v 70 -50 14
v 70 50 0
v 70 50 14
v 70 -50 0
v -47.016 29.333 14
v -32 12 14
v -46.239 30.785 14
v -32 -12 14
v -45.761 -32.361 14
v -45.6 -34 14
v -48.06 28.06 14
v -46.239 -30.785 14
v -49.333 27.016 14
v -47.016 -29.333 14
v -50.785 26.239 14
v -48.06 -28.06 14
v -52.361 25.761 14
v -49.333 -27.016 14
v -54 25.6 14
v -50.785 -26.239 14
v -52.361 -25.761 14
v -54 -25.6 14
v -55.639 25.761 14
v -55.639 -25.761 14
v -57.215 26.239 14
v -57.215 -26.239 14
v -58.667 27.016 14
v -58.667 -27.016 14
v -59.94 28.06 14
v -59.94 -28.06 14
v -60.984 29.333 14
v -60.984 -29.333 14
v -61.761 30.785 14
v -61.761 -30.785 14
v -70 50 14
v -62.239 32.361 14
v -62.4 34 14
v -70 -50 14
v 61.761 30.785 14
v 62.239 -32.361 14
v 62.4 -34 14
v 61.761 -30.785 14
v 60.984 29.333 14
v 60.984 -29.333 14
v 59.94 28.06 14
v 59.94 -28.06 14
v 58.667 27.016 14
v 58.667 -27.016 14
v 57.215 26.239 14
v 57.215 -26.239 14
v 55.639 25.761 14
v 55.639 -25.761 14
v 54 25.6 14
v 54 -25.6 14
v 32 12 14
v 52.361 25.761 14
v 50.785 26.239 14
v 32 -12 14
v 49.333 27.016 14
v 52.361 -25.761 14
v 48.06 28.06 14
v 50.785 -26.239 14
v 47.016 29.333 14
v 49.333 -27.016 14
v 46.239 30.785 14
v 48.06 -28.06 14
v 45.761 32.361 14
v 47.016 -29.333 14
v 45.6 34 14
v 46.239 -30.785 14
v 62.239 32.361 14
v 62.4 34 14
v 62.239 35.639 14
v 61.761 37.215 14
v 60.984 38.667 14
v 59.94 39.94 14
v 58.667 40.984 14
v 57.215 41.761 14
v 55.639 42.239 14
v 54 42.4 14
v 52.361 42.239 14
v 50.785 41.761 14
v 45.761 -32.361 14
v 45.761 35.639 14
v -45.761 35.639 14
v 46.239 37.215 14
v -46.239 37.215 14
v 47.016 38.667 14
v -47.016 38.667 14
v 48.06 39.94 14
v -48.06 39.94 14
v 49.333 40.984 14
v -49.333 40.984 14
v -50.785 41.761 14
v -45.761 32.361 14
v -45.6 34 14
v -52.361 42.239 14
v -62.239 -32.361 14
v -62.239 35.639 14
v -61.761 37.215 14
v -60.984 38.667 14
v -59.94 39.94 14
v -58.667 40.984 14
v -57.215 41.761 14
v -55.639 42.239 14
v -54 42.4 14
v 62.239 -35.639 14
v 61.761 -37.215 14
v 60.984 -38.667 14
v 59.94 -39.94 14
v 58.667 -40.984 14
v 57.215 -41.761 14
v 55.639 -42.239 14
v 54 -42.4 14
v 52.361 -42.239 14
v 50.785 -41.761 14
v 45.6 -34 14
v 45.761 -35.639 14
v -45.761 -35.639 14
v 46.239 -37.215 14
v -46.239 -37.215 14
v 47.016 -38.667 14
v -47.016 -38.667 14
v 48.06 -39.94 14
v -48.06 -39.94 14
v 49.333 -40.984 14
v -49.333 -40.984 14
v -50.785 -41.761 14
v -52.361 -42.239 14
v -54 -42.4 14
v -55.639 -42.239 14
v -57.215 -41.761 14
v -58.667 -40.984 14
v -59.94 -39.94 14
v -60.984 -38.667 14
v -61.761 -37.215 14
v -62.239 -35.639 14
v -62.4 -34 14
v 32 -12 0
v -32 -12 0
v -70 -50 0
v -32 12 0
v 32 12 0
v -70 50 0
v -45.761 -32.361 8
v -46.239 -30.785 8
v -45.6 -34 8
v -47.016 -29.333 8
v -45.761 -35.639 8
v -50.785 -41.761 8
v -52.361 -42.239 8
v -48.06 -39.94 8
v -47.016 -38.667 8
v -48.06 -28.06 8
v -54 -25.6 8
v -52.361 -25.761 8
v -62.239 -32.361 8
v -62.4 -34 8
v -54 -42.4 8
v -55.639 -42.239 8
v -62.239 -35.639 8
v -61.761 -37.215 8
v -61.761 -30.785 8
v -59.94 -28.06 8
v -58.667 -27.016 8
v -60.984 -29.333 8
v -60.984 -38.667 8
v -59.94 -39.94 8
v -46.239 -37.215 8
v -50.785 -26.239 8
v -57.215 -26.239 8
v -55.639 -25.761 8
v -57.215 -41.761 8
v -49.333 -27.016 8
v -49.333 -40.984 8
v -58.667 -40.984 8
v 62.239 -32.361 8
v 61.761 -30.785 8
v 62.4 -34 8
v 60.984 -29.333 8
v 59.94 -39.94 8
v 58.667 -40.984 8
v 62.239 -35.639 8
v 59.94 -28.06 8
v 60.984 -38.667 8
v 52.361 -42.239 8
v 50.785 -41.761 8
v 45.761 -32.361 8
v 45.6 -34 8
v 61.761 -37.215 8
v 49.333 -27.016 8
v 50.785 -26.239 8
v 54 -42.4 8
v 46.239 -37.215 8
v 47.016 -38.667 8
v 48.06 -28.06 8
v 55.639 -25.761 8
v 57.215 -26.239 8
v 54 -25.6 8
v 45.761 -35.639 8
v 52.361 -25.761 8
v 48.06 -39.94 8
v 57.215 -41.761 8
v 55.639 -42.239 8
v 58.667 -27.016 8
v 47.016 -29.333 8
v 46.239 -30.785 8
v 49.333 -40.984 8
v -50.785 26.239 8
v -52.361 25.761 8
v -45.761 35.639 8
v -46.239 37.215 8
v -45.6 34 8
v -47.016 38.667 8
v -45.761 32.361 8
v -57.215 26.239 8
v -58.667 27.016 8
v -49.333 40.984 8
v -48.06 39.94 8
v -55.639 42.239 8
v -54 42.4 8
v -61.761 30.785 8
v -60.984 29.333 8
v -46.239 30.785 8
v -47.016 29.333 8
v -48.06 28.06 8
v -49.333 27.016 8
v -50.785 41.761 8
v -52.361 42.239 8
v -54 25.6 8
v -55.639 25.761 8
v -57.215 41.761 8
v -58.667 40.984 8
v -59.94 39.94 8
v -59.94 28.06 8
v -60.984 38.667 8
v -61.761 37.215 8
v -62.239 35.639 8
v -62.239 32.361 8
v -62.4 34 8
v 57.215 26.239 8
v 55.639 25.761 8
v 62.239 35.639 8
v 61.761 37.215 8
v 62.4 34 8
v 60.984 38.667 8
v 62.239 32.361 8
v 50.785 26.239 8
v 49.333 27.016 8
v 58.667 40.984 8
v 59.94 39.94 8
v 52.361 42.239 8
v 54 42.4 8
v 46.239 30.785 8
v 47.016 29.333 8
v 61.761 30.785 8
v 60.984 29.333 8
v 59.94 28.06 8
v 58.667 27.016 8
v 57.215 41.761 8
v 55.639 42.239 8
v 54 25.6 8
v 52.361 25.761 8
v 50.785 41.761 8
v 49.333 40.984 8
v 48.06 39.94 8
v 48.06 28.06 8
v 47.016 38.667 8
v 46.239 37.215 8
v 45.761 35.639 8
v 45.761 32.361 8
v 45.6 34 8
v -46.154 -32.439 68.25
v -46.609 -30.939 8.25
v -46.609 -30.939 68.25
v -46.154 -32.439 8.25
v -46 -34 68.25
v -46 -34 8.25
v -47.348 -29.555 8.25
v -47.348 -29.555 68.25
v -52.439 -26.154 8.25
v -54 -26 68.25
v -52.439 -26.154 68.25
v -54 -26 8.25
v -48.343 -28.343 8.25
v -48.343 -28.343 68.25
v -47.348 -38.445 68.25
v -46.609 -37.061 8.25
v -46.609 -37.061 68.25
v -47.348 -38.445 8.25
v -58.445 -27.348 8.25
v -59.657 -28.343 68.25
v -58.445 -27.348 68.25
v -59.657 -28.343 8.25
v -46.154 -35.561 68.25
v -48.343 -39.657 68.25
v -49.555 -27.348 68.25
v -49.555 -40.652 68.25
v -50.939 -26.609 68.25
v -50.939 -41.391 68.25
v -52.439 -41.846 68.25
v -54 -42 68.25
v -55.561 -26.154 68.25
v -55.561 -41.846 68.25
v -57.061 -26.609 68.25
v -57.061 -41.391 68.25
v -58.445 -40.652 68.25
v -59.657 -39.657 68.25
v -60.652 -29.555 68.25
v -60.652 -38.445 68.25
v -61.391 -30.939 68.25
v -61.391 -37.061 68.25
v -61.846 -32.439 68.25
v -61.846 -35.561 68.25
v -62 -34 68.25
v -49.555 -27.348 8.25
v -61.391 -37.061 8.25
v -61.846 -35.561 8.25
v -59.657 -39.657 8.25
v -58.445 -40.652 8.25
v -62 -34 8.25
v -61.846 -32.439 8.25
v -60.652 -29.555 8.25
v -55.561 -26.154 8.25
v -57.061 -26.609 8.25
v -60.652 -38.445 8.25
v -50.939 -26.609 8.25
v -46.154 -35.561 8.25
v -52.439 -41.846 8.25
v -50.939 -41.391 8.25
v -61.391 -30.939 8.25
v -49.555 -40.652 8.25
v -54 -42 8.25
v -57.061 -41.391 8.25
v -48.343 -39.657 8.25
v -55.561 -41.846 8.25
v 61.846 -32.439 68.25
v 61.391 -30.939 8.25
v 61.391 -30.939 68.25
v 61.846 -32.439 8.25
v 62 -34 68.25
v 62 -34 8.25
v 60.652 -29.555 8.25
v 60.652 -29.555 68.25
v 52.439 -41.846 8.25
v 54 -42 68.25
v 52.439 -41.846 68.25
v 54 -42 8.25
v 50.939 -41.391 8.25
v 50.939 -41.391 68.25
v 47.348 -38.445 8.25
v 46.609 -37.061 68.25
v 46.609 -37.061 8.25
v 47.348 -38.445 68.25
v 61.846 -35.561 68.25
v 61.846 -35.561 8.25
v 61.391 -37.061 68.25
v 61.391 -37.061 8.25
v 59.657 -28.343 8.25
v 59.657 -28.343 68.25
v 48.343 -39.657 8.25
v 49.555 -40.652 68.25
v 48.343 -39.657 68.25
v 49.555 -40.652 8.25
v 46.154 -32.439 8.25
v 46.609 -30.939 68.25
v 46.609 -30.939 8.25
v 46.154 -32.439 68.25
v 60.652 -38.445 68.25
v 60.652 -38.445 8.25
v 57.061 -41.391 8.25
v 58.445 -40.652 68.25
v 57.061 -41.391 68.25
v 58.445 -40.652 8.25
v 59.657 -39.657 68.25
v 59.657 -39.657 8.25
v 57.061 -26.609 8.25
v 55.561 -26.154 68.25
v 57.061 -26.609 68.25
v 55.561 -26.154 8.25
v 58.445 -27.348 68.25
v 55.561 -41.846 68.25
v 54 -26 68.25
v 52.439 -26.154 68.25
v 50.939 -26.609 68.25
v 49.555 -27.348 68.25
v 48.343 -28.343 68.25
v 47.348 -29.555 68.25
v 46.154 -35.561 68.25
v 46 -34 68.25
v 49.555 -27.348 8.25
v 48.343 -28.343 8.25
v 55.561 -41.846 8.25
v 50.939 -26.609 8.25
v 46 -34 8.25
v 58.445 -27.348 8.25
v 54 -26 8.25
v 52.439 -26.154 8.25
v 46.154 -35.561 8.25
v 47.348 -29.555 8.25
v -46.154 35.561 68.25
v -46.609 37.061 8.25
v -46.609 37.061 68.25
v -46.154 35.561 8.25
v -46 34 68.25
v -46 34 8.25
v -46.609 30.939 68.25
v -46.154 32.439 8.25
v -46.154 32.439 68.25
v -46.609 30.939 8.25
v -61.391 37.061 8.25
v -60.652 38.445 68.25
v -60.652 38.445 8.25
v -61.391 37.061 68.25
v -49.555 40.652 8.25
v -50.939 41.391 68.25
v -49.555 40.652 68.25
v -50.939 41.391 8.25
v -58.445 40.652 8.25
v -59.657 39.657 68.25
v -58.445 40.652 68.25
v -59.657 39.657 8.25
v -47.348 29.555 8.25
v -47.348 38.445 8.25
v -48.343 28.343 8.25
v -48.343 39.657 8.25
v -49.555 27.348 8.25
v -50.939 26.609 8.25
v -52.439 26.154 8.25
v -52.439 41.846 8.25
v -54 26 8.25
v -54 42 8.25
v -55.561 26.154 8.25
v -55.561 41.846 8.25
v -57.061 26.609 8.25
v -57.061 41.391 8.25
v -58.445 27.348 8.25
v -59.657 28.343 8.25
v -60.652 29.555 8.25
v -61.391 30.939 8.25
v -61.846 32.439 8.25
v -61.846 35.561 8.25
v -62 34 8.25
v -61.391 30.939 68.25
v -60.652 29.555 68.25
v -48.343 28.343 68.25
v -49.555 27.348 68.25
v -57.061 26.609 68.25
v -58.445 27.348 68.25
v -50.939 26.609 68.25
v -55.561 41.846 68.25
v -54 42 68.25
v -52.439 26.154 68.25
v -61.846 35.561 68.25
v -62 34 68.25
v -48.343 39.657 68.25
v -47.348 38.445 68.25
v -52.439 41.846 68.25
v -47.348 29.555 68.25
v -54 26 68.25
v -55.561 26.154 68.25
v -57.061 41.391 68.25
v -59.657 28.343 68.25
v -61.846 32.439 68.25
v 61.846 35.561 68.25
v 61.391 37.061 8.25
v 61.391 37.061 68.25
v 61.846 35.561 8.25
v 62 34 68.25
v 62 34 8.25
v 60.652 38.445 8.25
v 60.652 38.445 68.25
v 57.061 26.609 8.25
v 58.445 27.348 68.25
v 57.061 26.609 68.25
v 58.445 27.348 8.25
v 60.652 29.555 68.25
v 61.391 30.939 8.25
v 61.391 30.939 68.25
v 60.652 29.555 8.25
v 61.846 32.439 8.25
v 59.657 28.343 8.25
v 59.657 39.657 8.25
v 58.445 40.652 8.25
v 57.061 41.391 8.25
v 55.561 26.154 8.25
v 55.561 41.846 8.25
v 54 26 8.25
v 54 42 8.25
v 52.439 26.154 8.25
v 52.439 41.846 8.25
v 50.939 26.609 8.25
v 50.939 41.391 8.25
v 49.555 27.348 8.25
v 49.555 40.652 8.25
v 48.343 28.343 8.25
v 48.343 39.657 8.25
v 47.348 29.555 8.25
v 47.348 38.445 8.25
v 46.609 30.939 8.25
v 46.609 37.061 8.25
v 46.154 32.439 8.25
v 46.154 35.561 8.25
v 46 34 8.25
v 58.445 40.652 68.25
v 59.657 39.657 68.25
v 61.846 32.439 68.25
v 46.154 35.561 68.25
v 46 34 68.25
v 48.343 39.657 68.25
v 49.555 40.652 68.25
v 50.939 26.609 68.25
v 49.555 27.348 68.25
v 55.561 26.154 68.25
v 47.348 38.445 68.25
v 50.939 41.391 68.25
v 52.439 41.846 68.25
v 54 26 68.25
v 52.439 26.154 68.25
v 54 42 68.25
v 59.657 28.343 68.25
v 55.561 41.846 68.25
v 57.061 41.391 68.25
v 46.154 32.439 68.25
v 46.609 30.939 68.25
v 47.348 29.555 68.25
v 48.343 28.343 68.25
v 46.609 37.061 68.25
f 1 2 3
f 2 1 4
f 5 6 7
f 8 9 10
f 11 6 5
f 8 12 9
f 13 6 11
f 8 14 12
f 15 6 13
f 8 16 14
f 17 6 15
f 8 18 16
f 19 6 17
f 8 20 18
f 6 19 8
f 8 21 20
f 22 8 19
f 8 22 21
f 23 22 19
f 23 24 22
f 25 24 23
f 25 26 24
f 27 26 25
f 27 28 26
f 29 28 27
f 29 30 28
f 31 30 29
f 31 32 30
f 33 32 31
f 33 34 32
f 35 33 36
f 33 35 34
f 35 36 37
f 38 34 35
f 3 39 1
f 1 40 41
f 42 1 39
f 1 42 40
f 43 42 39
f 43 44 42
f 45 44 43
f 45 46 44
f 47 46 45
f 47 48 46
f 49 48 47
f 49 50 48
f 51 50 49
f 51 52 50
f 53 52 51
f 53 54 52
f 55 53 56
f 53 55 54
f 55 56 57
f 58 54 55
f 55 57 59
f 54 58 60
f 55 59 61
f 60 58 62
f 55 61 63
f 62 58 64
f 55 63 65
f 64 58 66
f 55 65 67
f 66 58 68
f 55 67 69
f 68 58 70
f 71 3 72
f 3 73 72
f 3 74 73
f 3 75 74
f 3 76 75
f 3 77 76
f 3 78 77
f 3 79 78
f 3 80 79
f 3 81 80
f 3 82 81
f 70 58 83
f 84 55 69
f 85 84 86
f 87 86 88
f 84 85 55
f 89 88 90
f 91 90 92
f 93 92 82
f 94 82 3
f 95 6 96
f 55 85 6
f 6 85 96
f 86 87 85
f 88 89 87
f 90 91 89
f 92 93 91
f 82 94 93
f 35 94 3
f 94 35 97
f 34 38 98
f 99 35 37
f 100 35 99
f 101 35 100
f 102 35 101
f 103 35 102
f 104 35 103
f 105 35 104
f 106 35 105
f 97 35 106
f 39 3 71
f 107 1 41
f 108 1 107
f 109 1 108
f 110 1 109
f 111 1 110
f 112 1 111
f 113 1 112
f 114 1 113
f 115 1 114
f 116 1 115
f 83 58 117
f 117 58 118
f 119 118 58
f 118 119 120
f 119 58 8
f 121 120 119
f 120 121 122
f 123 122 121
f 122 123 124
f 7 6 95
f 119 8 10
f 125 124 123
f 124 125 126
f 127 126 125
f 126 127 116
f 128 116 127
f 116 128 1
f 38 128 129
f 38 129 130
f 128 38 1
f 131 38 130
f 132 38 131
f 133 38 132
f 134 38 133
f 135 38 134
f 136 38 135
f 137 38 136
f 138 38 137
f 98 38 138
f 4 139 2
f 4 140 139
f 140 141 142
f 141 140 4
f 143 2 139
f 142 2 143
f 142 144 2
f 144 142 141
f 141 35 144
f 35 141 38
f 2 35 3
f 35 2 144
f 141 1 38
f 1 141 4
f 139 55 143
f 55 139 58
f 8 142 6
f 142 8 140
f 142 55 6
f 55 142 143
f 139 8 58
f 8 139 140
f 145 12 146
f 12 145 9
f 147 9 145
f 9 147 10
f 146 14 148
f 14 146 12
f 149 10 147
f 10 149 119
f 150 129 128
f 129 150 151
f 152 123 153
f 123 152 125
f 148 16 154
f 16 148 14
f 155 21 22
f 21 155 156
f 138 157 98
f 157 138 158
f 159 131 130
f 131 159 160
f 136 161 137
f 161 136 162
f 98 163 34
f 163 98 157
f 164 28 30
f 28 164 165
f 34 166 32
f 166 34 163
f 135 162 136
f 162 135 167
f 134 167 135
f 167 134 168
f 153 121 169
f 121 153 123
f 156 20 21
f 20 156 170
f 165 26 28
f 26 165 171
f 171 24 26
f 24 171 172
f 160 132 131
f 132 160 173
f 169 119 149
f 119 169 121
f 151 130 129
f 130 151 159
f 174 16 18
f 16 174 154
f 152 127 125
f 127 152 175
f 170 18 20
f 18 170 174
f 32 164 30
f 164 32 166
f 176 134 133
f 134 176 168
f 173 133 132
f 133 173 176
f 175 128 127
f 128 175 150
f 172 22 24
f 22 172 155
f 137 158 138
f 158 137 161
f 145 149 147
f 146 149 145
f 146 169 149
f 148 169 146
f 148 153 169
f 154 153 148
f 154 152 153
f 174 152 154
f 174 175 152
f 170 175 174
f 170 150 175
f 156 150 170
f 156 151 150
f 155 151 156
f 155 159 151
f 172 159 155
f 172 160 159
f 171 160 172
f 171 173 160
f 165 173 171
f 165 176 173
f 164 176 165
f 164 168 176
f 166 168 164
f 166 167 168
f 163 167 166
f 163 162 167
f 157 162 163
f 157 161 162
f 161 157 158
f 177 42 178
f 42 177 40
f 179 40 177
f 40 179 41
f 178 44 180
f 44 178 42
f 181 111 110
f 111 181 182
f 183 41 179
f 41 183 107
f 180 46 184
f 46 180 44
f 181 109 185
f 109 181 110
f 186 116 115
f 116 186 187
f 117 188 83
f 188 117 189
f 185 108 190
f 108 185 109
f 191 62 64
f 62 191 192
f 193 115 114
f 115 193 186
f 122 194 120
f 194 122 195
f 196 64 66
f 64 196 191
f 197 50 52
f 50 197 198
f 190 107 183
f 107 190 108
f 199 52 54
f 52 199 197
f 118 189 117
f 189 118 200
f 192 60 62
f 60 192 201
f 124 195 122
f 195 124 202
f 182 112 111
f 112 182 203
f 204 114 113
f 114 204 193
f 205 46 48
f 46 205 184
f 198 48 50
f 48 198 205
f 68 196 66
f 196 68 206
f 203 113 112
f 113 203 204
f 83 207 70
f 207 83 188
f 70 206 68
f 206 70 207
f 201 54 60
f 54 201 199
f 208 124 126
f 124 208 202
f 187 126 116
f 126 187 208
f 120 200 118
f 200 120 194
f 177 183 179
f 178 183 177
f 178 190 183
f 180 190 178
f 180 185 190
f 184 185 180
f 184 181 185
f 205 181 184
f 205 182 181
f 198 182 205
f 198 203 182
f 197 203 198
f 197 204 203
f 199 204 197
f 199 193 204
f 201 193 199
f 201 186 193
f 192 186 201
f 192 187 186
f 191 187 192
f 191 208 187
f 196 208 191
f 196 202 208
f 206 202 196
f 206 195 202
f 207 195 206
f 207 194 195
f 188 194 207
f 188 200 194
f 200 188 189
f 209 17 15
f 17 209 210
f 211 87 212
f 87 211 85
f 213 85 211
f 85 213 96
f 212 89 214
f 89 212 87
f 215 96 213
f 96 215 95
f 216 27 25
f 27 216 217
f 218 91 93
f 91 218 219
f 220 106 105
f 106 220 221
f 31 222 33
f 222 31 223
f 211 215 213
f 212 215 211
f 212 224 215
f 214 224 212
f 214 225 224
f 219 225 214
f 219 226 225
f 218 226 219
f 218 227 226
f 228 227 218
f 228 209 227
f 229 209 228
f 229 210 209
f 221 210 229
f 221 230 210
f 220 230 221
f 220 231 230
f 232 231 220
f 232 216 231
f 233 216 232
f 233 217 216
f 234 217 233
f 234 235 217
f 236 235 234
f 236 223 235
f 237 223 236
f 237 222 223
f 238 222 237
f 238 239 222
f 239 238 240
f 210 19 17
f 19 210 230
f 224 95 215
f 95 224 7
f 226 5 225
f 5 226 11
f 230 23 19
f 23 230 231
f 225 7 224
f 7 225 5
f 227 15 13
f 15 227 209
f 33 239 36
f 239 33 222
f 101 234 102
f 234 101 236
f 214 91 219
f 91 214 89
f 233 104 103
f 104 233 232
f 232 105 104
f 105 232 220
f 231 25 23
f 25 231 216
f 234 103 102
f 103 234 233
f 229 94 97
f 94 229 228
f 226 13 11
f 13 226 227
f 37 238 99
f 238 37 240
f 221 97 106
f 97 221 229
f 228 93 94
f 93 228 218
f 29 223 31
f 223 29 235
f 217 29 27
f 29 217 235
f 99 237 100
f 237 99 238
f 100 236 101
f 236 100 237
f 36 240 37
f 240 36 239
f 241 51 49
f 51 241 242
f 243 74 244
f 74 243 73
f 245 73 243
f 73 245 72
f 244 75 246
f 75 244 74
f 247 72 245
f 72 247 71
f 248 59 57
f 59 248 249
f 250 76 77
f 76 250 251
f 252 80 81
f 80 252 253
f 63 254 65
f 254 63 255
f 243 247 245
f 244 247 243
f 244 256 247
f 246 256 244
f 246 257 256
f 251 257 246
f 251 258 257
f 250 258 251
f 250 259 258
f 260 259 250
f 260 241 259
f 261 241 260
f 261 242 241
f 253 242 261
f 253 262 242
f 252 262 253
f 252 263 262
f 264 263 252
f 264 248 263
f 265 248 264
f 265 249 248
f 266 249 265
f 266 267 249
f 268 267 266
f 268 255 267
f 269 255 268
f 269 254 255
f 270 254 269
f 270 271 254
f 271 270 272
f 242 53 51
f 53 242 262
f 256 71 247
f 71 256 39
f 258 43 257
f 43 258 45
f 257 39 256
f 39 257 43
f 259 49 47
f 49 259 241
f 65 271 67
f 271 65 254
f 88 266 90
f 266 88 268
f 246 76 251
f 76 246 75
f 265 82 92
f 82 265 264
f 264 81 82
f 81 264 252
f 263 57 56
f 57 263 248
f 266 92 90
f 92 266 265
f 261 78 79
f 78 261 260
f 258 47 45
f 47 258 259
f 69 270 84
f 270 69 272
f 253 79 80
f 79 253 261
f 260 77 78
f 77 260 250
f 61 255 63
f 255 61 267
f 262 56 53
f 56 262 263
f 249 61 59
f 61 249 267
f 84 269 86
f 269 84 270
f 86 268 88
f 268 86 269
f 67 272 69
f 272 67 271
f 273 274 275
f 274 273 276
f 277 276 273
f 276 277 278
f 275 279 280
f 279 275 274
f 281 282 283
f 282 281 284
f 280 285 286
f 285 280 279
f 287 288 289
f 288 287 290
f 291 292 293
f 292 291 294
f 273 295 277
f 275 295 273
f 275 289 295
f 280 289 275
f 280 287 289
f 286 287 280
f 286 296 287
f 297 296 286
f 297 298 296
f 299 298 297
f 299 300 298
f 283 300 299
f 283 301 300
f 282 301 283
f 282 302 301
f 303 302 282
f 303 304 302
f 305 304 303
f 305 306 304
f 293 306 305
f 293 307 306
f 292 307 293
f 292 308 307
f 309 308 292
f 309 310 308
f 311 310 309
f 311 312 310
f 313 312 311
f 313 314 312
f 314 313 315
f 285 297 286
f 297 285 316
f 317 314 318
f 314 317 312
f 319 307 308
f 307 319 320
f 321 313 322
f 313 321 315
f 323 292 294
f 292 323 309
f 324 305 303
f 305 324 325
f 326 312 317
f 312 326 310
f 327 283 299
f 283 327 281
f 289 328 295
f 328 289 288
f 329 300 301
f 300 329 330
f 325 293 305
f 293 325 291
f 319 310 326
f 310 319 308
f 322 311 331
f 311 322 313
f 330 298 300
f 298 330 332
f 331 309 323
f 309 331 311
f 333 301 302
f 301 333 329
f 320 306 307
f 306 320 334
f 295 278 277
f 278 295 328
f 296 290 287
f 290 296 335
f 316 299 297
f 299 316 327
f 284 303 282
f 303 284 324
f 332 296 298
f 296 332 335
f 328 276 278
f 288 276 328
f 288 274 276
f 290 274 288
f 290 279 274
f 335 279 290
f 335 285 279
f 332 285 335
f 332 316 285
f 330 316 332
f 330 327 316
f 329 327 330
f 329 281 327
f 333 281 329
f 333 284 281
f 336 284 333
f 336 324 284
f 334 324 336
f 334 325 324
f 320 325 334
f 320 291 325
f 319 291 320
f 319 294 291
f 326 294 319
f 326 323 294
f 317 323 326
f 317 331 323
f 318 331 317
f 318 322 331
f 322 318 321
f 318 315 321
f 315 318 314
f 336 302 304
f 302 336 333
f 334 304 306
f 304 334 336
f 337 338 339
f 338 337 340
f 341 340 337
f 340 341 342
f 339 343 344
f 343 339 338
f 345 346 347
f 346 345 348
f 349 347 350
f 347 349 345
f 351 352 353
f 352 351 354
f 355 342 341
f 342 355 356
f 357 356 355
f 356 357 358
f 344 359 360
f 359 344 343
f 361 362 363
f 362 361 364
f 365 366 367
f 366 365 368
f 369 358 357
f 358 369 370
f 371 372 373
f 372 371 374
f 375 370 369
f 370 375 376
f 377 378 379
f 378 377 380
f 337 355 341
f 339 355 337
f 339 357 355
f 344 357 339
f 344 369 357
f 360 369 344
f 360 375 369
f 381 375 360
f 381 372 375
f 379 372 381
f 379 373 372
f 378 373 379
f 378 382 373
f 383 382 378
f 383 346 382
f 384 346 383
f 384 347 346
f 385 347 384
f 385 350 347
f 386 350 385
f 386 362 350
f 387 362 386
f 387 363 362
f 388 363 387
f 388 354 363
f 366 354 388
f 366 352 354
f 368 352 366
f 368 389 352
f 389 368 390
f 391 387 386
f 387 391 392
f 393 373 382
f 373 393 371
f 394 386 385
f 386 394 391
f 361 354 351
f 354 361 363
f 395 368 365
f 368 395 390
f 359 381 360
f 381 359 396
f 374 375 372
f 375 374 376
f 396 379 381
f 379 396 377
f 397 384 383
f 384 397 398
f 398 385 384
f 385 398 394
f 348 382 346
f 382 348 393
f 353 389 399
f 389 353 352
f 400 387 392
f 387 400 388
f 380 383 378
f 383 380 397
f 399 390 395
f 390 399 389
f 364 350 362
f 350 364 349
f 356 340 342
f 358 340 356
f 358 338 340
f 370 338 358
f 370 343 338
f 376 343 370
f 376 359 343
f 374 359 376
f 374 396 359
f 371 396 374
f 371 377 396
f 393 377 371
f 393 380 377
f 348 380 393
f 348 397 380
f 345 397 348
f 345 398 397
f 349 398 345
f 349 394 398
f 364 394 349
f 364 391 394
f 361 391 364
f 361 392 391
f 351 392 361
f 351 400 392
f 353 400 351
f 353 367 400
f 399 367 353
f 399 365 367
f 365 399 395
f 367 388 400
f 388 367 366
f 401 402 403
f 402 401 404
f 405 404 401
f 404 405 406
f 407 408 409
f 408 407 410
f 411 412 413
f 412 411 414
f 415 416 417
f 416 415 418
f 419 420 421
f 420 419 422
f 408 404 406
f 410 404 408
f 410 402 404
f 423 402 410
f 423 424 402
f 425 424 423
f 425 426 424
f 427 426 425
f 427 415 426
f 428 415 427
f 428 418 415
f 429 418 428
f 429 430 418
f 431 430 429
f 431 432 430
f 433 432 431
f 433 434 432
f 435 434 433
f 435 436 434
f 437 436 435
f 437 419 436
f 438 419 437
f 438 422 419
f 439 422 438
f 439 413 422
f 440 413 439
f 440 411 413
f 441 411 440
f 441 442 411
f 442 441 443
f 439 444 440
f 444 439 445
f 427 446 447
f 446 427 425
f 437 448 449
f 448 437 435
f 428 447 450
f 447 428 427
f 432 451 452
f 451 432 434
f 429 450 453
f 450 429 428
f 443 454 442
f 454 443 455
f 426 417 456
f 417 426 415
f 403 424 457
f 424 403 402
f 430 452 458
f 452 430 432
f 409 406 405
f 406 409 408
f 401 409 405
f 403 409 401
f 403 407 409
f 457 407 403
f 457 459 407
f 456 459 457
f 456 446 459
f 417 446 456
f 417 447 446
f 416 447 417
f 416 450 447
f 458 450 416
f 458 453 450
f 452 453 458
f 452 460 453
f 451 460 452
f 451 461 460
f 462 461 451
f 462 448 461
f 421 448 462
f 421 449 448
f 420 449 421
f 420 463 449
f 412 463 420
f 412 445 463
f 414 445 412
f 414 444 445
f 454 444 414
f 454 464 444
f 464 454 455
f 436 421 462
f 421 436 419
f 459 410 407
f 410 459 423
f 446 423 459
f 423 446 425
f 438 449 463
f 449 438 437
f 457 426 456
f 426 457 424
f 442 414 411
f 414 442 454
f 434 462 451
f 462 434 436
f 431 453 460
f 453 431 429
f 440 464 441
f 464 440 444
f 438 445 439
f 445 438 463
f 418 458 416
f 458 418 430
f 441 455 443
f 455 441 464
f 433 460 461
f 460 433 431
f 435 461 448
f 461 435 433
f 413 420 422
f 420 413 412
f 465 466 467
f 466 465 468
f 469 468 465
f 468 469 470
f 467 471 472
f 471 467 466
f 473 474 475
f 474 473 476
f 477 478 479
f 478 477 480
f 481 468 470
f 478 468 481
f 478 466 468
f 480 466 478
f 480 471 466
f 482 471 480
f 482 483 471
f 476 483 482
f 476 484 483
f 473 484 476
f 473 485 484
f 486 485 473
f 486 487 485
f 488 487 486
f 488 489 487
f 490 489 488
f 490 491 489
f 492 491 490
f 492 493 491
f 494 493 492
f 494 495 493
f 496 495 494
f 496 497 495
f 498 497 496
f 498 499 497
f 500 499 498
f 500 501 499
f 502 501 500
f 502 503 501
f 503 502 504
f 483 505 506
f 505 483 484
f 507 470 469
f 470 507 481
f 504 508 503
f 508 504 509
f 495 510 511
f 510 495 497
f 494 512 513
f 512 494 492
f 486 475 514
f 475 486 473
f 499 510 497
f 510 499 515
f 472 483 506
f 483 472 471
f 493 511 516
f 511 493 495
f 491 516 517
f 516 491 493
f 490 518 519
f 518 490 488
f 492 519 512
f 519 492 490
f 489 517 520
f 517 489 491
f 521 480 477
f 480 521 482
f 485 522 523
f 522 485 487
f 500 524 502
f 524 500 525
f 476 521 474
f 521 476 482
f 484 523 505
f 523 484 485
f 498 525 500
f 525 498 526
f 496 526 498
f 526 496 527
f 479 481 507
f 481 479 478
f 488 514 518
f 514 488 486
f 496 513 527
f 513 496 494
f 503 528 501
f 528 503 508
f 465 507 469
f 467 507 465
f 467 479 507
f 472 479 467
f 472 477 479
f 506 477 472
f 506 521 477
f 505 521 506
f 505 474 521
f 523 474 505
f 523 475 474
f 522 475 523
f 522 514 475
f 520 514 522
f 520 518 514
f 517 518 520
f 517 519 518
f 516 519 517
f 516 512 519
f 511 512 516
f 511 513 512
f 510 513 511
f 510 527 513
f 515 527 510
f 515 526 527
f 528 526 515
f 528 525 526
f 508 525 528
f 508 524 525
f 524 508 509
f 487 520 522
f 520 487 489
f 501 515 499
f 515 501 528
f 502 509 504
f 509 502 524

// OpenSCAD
$fn = 32;

// ------------------------------------------------------------------------
// Frame with four posts: 140 x 100 mm frame, four d16 posts
// Every part is its own module, assembly() places them once.
// ------------------------------------------------------------------------

// --- part 1 ---
module base_frame() {
  difference() {
    translate([-70, -50, 0]) cube([140, 100, 14]);
    translate([-32, -12, -1]) cube([64, 24, 16]);
    translate([-54, -34, 8]) cylinder(h = 7, d = 16.8);
    translate([54, -34, 8]) cylinder(h = 7, d = 16.8);
    translate([-54, 34, 8]) cylinder(h = 7, d = 16.8);
    translate([54, 34, 8]) cylinder(h = 7, d = 16.8);
  }
}

// --- part 2 ---
module post1() {
  cylinder(h = 60, d = 16);
}

// --- part 3 ---
module post2() {
  cylinder(h = 60, d = 16);
}

// --- part 4 ---
module post3() {
  cylinder(h = 60, d = 16);
}

// --- part 5 ---
module post4() {
  cylinder(h = 60, d = 16);
}

// --- assembly ---
module assembly() {
  translate([0, 0, 0]) rotate([0, 0, 0]) base_frame();
  translate([-54, -34, 8.25]) rotate([0, 0, 0]) post1();
  translate([54, -34, 8.25]) rotate([0, 0, 0]) post2();
  translate([-54, 34, 8.25]) rotate([0, 0, 0]) post3();
  translate([54, 34, 8.25]) rotate([0, 0, 0]) post4();
}

assembly();
